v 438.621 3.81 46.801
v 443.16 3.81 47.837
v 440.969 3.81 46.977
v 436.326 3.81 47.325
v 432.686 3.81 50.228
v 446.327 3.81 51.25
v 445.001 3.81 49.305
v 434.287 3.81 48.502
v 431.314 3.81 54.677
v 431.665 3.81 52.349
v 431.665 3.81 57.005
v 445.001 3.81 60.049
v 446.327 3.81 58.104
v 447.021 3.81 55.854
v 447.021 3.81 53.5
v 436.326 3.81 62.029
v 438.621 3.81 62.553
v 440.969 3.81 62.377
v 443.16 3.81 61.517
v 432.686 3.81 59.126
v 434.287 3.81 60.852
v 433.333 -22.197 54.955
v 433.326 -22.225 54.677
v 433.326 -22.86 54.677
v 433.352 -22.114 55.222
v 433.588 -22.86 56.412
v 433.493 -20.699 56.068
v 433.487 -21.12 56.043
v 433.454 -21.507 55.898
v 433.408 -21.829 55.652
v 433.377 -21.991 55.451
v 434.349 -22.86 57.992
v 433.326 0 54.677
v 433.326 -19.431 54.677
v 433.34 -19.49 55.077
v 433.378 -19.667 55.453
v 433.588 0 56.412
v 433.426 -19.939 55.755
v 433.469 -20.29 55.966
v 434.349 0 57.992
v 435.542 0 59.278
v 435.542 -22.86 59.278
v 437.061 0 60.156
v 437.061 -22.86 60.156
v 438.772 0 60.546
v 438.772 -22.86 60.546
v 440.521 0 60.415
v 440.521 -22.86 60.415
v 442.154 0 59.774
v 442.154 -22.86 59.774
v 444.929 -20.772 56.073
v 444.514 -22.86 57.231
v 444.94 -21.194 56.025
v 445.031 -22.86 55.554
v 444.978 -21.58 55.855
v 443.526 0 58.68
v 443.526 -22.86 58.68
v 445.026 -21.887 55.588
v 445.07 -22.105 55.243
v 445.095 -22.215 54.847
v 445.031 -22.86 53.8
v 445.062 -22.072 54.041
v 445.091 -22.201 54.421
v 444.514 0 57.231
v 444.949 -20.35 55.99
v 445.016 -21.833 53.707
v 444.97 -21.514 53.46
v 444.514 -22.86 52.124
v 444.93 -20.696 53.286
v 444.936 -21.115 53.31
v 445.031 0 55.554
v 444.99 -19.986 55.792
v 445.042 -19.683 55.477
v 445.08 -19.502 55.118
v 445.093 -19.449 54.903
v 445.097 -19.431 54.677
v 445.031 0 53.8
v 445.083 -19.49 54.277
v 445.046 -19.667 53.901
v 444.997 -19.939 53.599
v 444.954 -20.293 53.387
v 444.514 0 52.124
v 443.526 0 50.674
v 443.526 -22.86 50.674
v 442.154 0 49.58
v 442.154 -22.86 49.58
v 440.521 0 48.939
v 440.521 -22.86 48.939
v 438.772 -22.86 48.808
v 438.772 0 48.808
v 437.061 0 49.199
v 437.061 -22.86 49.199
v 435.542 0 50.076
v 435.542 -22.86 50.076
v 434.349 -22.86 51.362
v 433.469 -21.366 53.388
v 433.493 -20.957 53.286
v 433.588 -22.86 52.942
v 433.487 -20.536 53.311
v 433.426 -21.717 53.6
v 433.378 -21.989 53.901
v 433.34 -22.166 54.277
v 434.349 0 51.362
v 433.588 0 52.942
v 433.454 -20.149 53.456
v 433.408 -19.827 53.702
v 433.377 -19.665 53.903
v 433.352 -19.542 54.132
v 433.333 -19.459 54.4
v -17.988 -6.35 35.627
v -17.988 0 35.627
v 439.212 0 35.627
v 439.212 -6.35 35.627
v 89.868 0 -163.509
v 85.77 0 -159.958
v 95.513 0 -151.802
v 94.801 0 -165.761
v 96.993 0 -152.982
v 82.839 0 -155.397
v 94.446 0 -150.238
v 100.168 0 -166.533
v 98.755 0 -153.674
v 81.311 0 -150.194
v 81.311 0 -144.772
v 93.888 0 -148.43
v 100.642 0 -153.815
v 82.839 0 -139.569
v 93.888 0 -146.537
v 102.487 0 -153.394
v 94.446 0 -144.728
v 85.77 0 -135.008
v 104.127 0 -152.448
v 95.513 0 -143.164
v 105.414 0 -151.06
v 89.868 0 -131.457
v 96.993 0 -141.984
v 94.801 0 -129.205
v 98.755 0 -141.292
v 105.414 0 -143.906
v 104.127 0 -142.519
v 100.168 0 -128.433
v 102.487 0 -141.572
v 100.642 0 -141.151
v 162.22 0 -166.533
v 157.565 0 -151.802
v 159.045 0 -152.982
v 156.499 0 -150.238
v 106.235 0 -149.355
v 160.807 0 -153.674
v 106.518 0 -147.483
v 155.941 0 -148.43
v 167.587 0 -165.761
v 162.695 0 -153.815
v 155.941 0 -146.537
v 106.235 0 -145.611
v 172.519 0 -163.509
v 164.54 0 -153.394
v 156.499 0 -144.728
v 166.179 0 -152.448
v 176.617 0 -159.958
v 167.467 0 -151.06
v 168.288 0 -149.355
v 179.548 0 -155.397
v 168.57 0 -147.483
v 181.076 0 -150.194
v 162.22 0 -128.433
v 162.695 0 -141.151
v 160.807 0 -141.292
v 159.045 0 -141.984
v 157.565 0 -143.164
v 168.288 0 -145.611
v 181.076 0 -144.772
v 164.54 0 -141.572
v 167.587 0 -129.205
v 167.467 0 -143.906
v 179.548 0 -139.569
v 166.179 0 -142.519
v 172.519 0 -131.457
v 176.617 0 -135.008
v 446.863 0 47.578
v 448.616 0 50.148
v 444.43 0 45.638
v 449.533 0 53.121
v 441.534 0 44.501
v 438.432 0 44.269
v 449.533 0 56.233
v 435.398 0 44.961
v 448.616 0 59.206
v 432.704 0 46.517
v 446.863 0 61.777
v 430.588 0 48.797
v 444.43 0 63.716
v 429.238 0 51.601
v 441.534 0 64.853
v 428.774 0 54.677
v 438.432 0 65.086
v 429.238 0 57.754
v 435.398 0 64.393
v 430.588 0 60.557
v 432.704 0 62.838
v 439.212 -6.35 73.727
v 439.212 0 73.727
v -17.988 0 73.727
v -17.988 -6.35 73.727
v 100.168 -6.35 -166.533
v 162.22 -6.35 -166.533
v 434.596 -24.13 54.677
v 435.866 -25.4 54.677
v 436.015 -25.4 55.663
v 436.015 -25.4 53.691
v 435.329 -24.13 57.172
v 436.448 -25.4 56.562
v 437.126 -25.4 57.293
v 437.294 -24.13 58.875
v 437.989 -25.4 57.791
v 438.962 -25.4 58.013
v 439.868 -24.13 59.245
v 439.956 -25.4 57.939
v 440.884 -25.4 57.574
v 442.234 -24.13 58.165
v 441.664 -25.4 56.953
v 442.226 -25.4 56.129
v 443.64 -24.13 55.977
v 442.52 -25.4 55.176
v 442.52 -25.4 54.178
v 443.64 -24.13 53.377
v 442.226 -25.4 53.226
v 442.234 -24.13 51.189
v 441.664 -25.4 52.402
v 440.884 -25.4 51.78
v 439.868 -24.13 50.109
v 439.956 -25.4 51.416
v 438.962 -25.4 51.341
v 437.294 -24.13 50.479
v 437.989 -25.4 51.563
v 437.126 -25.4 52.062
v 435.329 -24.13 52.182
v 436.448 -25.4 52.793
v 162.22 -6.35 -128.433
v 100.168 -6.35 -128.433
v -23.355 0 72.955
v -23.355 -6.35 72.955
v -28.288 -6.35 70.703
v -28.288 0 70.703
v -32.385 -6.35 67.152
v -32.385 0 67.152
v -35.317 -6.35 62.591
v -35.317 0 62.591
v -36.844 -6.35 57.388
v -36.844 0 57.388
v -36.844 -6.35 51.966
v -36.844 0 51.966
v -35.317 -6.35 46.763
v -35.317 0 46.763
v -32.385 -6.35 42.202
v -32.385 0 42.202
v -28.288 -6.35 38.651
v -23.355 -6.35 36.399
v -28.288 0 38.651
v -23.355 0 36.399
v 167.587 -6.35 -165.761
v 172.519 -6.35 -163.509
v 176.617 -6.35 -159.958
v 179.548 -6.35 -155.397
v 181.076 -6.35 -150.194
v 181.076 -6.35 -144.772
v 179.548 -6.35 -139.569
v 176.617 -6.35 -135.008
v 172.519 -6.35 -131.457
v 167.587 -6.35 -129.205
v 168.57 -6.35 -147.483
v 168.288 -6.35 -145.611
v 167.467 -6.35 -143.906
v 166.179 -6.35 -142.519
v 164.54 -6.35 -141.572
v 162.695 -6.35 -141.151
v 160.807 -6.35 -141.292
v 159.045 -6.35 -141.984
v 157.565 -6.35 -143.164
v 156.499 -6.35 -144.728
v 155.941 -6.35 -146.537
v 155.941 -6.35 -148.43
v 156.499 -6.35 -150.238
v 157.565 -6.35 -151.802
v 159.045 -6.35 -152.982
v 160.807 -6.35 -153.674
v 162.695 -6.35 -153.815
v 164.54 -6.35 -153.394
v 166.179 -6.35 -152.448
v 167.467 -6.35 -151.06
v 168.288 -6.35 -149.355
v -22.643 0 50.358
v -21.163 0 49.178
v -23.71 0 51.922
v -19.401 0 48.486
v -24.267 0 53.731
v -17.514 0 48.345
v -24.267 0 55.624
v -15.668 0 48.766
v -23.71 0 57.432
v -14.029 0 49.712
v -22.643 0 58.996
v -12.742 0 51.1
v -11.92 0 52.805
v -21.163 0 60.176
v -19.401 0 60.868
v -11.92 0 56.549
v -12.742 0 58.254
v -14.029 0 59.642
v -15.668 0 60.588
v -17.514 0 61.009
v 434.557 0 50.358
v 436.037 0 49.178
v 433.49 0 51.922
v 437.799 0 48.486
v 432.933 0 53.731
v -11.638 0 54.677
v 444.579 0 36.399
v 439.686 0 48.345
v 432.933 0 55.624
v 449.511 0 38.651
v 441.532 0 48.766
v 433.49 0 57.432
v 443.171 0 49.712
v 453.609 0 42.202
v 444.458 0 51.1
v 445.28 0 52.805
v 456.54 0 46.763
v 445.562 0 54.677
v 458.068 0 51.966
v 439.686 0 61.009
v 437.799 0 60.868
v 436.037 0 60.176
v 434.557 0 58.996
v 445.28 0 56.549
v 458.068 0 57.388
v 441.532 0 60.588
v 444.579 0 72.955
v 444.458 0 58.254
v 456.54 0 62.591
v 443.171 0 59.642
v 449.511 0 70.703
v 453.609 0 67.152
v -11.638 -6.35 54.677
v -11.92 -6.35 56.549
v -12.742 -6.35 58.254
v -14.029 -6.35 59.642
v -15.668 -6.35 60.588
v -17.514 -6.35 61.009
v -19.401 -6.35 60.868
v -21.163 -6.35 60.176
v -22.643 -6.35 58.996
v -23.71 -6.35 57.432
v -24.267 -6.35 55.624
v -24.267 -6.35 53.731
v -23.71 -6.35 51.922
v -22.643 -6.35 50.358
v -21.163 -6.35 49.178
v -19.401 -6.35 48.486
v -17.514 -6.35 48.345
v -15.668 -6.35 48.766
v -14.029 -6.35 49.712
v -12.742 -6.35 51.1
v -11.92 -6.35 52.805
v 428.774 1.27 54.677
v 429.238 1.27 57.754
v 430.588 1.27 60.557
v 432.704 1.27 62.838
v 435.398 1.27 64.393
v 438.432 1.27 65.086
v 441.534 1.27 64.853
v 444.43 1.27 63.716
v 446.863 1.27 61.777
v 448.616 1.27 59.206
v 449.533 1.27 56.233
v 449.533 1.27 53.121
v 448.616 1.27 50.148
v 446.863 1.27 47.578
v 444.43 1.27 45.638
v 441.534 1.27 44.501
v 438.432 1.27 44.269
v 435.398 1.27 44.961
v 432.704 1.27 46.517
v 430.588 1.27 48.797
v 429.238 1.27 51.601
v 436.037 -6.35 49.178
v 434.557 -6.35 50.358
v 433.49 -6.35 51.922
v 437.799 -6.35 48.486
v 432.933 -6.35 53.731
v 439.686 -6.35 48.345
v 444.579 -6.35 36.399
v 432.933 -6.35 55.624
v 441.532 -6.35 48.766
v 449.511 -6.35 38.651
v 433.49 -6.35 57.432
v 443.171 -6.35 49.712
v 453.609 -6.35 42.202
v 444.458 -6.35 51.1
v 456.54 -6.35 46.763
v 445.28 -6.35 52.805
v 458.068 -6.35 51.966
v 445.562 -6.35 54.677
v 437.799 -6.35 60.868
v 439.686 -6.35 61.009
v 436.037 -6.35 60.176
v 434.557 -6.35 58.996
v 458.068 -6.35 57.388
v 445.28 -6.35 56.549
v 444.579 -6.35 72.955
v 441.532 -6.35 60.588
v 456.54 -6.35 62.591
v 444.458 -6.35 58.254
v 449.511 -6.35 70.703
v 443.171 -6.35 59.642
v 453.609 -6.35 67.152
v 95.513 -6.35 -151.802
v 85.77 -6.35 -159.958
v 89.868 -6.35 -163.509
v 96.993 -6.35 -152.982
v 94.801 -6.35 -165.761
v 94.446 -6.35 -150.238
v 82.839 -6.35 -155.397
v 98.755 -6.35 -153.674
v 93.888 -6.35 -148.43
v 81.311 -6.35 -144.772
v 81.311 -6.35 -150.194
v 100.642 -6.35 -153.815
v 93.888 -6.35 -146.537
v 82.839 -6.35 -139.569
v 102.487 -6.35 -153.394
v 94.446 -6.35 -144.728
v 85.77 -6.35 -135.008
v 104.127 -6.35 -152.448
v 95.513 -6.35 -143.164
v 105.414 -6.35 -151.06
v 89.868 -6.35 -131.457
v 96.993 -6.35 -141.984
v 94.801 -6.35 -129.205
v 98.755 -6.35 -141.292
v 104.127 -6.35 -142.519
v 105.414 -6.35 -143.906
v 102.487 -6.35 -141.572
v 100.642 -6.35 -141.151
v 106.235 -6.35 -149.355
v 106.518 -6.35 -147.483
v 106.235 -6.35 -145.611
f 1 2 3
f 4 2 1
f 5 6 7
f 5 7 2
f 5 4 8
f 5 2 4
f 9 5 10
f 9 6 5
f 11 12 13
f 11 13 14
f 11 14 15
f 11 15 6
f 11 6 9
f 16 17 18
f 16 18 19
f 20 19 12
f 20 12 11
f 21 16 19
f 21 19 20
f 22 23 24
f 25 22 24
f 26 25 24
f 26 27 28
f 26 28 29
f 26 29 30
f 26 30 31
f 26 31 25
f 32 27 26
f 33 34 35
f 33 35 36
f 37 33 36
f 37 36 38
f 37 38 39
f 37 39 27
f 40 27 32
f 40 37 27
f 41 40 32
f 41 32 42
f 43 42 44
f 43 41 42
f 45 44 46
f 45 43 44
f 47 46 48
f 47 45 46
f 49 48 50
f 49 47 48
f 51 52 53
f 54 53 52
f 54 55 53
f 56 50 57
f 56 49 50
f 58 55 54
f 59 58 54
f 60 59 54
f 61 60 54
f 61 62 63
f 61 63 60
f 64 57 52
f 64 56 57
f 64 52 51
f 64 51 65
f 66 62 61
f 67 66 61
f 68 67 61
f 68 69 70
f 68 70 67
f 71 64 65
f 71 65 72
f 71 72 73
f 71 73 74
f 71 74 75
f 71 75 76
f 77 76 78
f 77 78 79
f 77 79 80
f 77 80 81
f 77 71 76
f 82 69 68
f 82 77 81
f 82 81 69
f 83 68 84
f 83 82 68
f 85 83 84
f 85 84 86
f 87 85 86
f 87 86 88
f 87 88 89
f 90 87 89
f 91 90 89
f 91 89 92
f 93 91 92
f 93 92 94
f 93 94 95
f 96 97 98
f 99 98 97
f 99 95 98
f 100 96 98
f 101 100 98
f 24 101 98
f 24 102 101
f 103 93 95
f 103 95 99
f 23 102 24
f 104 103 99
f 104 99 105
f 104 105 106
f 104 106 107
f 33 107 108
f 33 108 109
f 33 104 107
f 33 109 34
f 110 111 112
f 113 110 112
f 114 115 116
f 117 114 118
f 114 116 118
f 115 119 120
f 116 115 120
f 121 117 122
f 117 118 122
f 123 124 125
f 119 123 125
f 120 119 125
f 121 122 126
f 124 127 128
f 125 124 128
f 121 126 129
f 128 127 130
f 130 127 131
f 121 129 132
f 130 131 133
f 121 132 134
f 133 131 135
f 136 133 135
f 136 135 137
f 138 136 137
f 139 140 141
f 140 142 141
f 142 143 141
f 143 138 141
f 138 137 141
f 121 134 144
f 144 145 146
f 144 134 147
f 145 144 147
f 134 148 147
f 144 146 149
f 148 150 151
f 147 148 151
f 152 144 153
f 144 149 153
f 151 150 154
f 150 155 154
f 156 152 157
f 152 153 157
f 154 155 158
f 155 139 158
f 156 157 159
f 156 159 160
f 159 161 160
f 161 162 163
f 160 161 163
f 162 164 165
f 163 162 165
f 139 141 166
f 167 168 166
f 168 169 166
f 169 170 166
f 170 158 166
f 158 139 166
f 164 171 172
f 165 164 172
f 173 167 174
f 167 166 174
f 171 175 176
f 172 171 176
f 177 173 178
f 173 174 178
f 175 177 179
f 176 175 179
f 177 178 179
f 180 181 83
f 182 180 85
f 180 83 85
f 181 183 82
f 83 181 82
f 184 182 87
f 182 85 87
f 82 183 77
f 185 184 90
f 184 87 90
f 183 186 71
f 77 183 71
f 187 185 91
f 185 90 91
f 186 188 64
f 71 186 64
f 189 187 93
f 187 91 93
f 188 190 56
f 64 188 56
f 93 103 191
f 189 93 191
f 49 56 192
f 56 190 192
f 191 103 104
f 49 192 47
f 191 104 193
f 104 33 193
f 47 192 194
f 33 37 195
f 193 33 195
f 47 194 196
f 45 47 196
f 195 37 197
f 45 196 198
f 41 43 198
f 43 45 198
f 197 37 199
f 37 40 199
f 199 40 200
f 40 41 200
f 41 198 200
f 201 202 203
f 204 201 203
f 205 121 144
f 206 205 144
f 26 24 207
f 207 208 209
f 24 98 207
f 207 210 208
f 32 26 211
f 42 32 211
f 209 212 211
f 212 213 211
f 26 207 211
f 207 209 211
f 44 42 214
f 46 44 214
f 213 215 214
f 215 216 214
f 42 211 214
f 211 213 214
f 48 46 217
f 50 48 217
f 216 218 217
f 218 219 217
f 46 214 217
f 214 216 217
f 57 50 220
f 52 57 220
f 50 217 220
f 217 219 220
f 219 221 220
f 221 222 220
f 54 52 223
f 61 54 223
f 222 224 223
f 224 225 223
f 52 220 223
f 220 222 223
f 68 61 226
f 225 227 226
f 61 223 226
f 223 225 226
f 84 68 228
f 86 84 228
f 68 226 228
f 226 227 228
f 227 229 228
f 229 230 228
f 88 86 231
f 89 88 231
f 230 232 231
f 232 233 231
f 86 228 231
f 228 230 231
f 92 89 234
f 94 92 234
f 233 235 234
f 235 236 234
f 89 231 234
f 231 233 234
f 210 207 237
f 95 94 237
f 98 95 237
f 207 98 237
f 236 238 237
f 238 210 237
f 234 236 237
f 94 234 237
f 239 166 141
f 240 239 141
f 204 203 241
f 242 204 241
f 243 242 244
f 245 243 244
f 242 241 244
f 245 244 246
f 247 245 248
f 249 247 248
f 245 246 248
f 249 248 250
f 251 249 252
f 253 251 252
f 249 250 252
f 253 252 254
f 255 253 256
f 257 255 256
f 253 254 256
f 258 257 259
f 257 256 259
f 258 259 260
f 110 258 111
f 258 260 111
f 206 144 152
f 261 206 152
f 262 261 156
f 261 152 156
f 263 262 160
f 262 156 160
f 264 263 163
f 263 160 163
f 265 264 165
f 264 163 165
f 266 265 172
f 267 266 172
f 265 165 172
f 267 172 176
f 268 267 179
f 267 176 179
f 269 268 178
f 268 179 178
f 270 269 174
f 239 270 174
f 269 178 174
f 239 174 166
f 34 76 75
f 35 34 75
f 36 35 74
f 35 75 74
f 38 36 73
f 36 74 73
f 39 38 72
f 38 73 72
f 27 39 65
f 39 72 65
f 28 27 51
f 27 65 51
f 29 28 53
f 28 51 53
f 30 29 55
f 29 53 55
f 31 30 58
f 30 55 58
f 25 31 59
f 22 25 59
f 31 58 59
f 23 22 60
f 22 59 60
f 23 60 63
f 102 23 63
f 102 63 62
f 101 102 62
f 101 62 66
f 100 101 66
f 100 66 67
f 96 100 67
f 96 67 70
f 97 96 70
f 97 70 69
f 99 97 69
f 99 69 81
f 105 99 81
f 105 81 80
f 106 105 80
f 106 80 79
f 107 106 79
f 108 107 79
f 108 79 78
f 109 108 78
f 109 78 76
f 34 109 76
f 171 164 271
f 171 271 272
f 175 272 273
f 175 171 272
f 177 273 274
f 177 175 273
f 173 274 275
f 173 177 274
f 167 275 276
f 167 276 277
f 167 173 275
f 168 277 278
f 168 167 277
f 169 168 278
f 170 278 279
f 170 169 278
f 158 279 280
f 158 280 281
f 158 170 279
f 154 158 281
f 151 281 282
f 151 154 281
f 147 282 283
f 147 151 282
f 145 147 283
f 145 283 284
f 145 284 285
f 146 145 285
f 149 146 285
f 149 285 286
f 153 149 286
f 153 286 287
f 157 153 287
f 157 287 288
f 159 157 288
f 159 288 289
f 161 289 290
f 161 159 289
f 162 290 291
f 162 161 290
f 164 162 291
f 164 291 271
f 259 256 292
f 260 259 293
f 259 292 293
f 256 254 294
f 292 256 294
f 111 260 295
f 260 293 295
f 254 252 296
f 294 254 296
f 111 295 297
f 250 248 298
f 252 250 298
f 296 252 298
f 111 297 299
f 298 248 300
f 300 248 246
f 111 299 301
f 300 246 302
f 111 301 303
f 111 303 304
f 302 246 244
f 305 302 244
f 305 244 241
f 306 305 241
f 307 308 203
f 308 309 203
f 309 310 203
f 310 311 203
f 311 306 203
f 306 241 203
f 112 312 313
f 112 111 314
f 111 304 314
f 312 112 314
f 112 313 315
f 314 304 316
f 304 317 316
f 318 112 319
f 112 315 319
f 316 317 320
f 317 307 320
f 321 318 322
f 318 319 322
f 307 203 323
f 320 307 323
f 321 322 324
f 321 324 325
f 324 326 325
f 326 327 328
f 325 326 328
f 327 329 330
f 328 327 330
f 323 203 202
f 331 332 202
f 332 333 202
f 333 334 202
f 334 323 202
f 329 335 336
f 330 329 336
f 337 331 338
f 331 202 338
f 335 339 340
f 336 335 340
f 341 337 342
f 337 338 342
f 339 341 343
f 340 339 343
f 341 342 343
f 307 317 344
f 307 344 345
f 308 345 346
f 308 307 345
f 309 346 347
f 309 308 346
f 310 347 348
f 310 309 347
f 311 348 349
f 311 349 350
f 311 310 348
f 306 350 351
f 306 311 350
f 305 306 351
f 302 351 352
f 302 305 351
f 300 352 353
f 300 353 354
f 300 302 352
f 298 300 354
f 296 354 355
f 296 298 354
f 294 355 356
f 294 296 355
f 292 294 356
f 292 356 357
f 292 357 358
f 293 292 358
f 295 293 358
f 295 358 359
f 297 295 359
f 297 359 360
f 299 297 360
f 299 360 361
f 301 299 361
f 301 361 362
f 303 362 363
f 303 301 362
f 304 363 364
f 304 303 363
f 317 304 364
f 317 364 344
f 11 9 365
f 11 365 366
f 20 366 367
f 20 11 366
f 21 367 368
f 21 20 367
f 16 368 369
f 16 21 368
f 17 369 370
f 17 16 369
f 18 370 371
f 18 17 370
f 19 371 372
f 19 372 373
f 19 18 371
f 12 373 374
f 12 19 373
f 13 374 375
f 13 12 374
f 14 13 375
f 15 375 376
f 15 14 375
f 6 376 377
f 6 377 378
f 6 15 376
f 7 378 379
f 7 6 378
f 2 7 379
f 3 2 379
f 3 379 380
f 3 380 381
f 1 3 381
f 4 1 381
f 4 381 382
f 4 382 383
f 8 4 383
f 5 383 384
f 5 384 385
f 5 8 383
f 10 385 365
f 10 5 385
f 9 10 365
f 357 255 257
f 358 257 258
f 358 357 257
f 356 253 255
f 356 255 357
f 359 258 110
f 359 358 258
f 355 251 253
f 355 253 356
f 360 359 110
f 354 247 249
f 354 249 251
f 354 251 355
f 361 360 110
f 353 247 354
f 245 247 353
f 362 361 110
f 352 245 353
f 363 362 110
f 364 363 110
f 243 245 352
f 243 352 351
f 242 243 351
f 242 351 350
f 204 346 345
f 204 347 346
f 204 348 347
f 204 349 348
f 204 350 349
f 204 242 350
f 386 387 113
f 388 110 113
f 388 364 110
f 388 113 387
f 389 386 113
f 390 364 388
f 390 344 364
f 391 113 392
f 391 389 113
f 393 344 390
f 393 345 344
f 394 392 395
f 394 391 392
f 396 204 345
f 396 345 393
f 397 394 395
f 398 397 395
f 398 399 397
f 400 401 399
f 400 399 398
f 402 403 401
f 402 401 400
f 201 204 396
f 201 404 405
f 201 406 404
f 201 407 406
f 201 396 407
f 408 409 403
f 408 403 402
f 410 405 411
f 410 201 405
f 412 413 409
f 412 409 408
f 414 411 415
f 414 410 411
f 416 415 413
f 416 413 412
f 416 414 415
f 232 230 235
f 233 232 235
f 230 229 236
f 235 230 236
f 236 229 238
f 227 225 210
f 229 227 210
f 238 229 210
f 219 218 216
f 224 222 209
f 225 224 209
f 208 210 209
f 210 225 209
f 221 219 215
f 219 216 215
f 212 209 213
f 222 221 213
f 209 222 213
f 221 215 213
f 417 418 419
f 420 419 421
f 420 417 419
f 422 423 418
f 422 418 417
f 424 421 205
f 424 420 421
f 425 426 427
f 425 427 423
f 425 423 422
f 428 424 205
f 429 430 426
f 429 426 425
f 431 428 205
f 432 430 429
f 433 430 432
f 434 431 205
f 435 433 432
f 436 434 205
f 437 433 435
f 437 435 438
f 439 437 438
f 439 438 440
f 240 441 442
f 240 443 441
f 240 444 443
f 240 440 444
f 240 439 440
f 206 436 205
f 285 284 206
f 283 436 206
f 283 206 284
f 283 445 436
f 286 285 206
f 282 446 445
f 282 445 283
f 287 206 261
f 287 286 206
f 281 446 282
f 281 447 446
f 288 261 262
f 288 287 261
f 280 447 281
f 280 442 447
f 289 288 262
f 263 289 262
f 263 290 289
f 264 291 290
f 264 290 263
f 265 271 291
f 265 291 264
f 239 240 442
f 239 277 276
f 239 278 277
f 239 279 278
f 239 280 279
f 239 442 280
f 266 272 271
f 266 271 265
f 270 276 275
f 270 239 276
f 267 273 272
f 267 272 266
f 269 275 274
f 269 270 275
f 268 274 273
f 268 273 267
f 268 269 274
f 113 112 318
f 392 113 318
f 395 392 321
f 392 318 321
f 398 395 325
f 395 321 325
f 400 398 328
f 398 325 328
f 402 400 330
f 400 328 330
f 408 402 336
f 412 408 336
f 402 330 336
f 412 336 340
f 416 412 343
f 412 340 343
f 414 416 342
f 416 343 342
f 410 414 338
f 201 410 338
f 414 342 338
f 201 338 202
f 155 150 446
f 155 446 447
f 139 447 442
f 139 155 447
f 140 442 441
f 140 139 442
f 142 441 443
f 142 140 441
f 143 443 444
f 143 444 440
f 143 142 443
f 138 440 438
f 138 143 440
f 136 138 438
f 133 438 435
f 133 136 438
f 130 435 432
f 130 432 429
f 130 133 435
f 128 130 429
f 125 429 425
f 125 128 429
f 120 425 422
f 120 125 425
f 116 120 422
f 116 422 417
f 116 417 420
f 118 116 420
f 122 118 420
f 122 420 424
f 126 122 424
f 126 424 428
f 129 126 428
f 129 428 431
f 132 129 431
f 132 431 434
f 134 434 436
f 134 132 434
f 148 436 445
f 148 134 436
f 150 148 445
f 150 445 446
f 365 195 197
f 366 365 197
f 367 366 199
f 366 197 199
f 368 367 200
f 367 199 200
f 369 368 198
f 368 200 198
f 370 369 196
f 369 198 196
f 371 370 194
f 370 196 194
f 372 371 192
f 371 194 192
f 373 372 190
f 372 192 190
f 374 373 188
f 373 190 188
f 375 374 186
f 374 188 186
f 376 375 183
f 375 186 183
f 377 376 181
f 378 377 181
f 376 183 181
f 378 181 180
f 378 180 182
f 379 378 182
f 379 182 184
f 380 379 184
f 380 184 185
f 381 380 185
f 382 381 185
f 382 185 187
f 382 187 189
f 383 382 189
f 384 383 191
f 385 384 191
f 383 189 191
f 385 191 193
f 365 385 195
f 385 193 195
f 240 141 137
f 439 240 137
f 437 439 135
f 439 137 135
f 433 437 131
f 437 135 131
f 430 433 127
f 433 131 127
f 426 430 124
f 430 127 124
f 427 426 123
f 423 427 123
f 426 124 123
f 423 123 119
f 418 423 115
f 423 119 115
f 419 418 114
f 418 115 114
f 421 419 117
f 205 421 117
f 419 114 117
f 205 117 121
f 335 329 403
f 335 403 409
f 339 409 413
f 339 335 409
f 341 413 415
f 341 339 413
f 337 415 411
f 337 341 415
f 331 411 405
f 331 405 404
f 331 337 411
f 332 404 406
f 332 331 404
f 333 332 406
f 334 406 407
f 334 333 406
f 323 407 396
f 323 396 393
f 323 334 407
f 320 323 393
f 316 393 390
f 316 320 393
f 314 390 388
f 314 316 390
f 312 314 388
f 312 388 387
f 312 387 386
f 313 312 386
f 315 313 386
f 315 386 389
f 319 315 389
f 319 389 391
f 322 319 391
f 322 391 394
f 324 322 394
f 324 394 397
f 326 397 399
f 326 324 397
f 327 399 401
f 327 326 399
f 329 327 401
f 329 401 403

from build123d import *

# Parameters (mm, degrees)
F0_R      = 6.35
F1_DEPTH  = 6.35
F2_R      = 5.8853584111
F3_DEPTH  = 25.4
F2_R_2    = 10.4377347768
F2_R_3    = 6.35
F4_DEPTH  = 3.81
F5_SIZE   = 2.54
F8_R      = 1.397
F9_DEPTH  = 482.1363584111
F10_R     = 6.35
F11_DEPTH = 6.35


with BuildPart() as f1:
    # F0 (on Front) → F1 (new body)
    with BuildSketch(Plane.XZ):
        with BuildLine():
            Line((439.211613113, 73.7270917265), (-17.988386887, 73.7270917265))
            ThreePointArc((-17.988386887, 73.7270917265), (-37.038386887, 54.6770917265), (-17.988386887, 35.6270917265))
            Line((-17.988386887, 35.6270917265), (439.211613113, 35.6270917265))
            ThreePointArc((439.211613113, 35.6270917265), (458.261613113, 54.6770917265), (439.211613113, 73.7270917265))
        make_face()
        with Locations((-17.988386887, 54.6770917265)):
            Circle(F0_R, mode=Mode.SUBTRACT)
        with Locations((439.211613113, 54.6770917265)):
            Circle(F0_R, mode=Mode.SUBTRACT)
    extrude(amount=F1_DEPTH)


with BuildPart() as f3:
    # F2 (on face) → F3 (new body)
    with BuildSketch(Plane(origin=(0, 0, 0), x_dir=(-1, 0, 0), z_dir=(0, 1, 0))):
        with Locations((-439.211613113, 54.6770917265)):
            Circle(F2_R)
    extrude(amount=-F3_DEPTH)

    # F2 (on face) → F4 (join)
    with BuildSketch(Plane(origin=(0, 0, 0), x_dir=(-1, 0, 0), z_dir=(0, 1, 0))):
        with Locations((-439.211613113, 54.6770917265)):
            Circle(F2_R_2)
        with Locations((-439.211613113, 54.6770917265)):
            Circle(F2_R_3, mode=Mode.SUBTRACT)
        with Locations((-439.211613113, 54.6770917265)):
            Circle(F2_R_3)
        with Locations((-439.211613113, 54.6770917265)):
            Circle(F2_R, mode=Mode.SUBTRACT)
        with Locations((-439.211613113, 54.6770917265)):
            Circle(F2_R)
    extrude(amount=F4_DEPTH)

    # F5
    f5_edges = [f3.edges().sort_by_distance(p)[0] for p in [
        (449.649348, 3.81, 54.677092),
        (445.096972, -25.4, 54.677092),
    ]]
    chamfer(f5_edges, length=F5_SIZE)

    # F8 (on line) → F9 (cut, through all)
    with BuildSketch(Plane.YZ.offset(445.0969715241)):
        with Locations((-20.8280000076, 54.6770917265)):
            Circle(F8_R)
    extrude(amount=-F9_DEPTH, mode=Mode.SUBTRACT)


with BuildPart() as f11:
    # F10 (on Front) → F11 (new body)
    with BuildSketch(Plane.XZ):
        with BuildLine():
            Line((162.2199646768, -128.4331359843), (100.1675096981, -128.4331359843))
            ThreePointArc((100.1675096981, -128.4331359843), (81.1175096981, -147.4831359843), (100.1675096981, -166.5331359843))
            Line((100.1675096981, -166.5331359843), (162.2199646768, -166.5331359843))
            ThreePointArc((162.2199646768, -166.5331359843), (181.2699646768, -147.4831359843), (162.2199646768, -128.4331359843))
        make_face()
        with Locations((100.1675096981, -147.4831359843)):
            Circle(F10_R, mode=Mode.SUBTRACT)
        with Locations((162.2199646768, -147.4831359843)):
            Circle(F10_R, mode=Mode.SUBTRACT)
    extrude(amount=F11_DEPTH)


solid = Compound([f1.part, f3.part, f11.part])
